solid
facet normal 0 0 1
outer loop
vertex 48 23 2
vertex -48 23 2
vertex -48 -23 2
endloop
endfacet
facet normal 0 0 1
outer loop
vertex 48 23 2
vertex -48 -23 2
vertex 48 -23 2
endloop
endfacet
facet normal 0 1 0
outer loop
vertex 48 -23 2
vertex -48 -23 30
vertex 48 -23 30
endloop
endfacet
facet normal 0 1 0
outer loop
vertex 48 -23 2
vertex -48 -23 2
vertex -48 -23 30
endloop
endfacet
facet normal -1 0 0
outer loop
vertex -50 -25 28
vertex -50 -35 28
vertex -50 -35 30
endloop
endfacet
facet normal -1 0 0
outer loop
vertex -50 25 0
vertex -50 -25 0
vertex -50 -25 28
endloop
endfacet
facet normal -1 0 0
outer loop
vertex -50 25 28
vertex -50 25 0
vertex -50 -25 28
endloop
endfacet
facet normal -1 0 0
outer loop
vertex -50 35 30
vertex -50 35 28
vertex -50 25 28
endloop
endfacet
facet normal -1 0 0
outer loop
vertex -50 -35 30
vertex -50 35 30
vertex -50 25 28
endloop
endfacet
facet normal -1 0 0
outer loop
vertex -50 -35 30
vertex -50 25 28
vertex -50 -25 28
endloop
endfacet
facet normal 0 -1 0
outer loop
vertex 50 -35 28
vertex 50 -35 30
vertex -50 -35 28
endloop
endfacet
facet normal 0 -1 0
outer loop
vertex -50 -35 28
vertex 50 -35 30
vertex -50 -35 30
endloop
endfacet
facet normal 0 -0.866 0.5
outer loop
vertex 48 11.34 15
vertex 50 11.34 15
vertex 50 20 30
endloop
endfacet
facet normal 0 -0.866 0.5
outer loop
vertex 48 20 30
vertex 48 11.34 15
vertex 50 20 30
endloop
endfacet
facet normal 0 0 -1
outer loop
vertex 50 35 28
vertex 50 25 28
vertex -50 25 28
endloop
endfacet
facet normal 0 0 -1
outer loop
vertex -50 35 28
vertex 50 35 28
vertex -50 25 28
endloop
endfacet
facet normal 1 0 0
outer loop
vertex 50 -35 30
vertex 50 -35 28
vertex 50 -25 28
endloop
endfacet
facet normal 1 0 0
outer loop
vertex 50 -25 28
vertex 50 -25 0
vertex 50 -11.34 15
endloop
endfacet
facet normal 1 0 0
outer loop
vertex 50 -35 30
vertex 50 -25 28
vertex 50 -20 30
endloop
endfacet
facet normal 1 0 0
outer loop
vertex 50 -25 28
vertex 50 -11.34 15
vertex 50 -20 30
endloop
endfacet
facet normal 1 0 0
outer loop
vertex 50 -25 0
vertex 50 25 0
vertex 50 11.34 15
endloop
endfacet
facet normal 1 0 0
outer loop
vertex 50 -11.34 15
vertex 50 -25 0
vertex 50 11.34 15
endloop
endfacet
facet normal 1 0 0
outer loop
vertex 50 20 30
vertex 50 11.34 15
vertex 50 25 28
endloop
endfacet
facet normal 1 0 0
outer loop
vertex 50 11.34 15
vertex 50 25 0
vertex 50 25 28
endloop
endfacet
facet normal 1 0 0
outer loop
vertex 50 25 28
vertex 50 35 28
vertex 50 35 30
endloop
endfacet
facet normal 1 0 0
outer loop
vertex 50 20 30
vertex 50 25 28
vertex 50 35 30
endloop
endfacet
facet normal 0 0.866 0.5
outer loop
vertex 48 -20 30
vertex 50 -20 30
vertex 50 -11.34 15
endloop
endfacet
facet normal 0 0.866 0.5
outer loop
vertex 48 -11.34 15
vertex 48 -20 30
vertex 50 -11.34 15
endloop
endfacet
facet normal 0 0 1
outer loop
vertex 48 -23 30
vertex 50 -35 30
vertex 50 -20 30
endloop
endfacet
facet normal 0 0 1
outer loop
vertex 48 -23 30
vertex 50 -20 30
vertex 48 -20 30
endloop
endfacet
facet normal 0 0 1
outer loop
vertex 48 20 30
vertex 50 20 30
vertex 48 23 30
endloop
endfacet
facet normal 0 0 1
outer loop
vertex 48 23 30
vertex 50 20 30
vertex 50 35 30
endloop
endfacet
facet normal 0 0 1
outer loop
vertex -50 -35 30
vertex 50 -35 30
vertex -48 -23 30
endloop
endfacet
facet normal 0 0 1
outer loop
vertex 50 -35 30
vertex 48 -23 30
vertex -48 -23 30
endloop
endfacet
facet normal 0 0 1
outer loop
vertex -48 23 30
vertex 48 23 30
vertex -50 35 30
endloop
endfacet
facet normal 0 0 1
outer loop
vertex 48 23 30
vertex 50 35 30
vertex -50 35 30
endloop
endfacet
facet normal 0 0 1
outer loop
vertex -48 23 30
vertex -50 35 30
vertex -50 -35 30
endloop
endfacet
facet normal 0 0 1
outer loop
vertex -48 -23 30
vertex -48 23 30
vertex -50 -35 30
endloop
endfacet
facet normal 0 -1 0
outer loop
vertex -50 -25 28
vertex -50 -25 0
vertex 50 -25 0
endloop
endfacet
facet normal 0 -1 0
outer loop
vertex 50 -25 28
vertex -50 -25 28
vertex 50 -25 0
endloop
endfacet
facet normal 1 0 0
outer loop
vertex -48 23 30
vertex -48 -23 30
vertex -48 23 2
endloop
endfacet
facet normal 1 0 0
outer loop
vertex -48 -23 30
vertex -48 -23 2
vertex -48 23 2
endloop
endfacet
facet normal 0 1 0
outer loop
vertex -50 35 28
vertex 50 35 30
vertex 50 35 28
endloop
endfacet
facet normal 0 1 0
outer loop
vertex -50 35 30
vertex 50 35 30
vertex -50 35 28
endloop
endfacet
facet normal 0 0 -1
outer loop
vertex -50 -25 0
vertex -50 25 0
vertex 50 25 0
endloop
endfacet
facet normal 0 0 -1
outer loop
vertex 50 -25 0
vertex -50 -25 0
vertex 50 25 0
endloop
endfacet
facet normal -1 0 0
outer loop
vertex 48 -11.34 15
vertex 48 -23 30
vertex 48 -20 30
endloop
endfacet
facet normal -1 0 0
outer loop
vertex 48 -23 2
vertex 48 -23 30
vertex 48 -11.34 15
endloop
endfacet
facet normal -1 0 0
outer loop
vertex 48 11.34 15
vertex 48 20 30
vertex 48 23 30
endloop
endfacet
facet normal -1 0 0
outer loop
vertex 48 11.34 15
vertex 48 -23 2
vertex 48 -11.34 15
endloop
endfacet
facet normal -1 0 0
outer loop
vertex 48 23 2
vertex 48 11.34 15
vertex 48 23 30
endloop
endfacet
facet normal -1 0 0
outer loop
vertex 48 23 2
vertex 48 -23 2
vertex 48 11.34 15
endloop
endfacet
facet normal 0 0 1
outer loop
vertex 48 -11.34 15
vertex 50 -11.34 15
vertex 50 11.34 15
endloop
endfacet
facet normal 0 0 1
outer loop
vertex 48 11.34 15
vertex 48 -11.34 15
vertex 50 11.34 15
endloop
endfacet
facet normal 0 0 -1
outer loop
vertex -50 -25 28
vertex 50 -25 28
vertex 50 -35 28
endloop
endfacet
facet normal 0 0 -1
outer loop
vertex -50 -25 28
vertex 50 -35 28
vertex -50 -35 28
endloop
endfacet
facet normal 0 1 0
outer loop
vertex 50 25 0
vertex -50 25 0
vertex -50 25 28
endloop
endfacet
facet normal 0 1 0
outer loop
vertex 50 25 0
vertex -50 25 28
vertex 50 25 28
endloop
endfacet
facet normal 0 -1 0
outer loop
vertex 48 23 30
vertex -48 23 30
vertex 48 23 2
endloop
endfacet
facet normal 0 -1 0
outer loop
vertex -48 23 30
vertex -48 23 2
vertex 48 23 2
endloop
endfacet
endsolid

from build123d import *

# Parameters (mm, degrees)
F0_W     = 100
F0_H     = 50
F1_DEPTH = 30
F2_T     = -2
F3_W     = 100
F3_H     = 2
F4_DEPTH = 10
F7_DEPTH = 2


# Not quite as in the source:
# - a pattern or mirror of a feature is missing from the dataset's text; its kind, count and spacing are read off the source's solid


with BuildPart() as f1:
    # F0 (on Top) → F1 (new body)
    with BuildSketch(Plane.XY):
        Rectangle(F0_W, F0_H)
    extrude(amount=F1_DEPTH)

    # F2
    f2_openings = [f1.faces().sort_by_distance(p)[0] for p in [
        (0, 0, 30),
    ]]
    offset(amount=F2_T, openings=f2_openings)

    # F3 (on face) → F4 (join)
    with BuildSketch(Plane(origin=(0, 25, 0), x_dir=(-1, 0, 0), z_dir=(0, 1, 0))):
        with Locations((0, 29)):
            Rectangle(F3_W, F3_H)
    f4 = extrude(amount=F4_DEPTH)

    # F4_copies: F4 across plane
    add(f4.mirror(Plane(origin=(0, 0, 0), x_dir=(0, 0, -1), z_dir=(0, -1, 0))))

    # F6 (on face) → F7 (cut, through all)
    with BuildSketch(Plane.YZ.offset(50)):
        Polygon((11.3397459622, 15), (20, 30), (-20, 30), (-11.3397459622, 15), align=None)
    extrude(amount=-F7_DEPTH, mode=Mode.SUBTRACT)


solid = f1.part
